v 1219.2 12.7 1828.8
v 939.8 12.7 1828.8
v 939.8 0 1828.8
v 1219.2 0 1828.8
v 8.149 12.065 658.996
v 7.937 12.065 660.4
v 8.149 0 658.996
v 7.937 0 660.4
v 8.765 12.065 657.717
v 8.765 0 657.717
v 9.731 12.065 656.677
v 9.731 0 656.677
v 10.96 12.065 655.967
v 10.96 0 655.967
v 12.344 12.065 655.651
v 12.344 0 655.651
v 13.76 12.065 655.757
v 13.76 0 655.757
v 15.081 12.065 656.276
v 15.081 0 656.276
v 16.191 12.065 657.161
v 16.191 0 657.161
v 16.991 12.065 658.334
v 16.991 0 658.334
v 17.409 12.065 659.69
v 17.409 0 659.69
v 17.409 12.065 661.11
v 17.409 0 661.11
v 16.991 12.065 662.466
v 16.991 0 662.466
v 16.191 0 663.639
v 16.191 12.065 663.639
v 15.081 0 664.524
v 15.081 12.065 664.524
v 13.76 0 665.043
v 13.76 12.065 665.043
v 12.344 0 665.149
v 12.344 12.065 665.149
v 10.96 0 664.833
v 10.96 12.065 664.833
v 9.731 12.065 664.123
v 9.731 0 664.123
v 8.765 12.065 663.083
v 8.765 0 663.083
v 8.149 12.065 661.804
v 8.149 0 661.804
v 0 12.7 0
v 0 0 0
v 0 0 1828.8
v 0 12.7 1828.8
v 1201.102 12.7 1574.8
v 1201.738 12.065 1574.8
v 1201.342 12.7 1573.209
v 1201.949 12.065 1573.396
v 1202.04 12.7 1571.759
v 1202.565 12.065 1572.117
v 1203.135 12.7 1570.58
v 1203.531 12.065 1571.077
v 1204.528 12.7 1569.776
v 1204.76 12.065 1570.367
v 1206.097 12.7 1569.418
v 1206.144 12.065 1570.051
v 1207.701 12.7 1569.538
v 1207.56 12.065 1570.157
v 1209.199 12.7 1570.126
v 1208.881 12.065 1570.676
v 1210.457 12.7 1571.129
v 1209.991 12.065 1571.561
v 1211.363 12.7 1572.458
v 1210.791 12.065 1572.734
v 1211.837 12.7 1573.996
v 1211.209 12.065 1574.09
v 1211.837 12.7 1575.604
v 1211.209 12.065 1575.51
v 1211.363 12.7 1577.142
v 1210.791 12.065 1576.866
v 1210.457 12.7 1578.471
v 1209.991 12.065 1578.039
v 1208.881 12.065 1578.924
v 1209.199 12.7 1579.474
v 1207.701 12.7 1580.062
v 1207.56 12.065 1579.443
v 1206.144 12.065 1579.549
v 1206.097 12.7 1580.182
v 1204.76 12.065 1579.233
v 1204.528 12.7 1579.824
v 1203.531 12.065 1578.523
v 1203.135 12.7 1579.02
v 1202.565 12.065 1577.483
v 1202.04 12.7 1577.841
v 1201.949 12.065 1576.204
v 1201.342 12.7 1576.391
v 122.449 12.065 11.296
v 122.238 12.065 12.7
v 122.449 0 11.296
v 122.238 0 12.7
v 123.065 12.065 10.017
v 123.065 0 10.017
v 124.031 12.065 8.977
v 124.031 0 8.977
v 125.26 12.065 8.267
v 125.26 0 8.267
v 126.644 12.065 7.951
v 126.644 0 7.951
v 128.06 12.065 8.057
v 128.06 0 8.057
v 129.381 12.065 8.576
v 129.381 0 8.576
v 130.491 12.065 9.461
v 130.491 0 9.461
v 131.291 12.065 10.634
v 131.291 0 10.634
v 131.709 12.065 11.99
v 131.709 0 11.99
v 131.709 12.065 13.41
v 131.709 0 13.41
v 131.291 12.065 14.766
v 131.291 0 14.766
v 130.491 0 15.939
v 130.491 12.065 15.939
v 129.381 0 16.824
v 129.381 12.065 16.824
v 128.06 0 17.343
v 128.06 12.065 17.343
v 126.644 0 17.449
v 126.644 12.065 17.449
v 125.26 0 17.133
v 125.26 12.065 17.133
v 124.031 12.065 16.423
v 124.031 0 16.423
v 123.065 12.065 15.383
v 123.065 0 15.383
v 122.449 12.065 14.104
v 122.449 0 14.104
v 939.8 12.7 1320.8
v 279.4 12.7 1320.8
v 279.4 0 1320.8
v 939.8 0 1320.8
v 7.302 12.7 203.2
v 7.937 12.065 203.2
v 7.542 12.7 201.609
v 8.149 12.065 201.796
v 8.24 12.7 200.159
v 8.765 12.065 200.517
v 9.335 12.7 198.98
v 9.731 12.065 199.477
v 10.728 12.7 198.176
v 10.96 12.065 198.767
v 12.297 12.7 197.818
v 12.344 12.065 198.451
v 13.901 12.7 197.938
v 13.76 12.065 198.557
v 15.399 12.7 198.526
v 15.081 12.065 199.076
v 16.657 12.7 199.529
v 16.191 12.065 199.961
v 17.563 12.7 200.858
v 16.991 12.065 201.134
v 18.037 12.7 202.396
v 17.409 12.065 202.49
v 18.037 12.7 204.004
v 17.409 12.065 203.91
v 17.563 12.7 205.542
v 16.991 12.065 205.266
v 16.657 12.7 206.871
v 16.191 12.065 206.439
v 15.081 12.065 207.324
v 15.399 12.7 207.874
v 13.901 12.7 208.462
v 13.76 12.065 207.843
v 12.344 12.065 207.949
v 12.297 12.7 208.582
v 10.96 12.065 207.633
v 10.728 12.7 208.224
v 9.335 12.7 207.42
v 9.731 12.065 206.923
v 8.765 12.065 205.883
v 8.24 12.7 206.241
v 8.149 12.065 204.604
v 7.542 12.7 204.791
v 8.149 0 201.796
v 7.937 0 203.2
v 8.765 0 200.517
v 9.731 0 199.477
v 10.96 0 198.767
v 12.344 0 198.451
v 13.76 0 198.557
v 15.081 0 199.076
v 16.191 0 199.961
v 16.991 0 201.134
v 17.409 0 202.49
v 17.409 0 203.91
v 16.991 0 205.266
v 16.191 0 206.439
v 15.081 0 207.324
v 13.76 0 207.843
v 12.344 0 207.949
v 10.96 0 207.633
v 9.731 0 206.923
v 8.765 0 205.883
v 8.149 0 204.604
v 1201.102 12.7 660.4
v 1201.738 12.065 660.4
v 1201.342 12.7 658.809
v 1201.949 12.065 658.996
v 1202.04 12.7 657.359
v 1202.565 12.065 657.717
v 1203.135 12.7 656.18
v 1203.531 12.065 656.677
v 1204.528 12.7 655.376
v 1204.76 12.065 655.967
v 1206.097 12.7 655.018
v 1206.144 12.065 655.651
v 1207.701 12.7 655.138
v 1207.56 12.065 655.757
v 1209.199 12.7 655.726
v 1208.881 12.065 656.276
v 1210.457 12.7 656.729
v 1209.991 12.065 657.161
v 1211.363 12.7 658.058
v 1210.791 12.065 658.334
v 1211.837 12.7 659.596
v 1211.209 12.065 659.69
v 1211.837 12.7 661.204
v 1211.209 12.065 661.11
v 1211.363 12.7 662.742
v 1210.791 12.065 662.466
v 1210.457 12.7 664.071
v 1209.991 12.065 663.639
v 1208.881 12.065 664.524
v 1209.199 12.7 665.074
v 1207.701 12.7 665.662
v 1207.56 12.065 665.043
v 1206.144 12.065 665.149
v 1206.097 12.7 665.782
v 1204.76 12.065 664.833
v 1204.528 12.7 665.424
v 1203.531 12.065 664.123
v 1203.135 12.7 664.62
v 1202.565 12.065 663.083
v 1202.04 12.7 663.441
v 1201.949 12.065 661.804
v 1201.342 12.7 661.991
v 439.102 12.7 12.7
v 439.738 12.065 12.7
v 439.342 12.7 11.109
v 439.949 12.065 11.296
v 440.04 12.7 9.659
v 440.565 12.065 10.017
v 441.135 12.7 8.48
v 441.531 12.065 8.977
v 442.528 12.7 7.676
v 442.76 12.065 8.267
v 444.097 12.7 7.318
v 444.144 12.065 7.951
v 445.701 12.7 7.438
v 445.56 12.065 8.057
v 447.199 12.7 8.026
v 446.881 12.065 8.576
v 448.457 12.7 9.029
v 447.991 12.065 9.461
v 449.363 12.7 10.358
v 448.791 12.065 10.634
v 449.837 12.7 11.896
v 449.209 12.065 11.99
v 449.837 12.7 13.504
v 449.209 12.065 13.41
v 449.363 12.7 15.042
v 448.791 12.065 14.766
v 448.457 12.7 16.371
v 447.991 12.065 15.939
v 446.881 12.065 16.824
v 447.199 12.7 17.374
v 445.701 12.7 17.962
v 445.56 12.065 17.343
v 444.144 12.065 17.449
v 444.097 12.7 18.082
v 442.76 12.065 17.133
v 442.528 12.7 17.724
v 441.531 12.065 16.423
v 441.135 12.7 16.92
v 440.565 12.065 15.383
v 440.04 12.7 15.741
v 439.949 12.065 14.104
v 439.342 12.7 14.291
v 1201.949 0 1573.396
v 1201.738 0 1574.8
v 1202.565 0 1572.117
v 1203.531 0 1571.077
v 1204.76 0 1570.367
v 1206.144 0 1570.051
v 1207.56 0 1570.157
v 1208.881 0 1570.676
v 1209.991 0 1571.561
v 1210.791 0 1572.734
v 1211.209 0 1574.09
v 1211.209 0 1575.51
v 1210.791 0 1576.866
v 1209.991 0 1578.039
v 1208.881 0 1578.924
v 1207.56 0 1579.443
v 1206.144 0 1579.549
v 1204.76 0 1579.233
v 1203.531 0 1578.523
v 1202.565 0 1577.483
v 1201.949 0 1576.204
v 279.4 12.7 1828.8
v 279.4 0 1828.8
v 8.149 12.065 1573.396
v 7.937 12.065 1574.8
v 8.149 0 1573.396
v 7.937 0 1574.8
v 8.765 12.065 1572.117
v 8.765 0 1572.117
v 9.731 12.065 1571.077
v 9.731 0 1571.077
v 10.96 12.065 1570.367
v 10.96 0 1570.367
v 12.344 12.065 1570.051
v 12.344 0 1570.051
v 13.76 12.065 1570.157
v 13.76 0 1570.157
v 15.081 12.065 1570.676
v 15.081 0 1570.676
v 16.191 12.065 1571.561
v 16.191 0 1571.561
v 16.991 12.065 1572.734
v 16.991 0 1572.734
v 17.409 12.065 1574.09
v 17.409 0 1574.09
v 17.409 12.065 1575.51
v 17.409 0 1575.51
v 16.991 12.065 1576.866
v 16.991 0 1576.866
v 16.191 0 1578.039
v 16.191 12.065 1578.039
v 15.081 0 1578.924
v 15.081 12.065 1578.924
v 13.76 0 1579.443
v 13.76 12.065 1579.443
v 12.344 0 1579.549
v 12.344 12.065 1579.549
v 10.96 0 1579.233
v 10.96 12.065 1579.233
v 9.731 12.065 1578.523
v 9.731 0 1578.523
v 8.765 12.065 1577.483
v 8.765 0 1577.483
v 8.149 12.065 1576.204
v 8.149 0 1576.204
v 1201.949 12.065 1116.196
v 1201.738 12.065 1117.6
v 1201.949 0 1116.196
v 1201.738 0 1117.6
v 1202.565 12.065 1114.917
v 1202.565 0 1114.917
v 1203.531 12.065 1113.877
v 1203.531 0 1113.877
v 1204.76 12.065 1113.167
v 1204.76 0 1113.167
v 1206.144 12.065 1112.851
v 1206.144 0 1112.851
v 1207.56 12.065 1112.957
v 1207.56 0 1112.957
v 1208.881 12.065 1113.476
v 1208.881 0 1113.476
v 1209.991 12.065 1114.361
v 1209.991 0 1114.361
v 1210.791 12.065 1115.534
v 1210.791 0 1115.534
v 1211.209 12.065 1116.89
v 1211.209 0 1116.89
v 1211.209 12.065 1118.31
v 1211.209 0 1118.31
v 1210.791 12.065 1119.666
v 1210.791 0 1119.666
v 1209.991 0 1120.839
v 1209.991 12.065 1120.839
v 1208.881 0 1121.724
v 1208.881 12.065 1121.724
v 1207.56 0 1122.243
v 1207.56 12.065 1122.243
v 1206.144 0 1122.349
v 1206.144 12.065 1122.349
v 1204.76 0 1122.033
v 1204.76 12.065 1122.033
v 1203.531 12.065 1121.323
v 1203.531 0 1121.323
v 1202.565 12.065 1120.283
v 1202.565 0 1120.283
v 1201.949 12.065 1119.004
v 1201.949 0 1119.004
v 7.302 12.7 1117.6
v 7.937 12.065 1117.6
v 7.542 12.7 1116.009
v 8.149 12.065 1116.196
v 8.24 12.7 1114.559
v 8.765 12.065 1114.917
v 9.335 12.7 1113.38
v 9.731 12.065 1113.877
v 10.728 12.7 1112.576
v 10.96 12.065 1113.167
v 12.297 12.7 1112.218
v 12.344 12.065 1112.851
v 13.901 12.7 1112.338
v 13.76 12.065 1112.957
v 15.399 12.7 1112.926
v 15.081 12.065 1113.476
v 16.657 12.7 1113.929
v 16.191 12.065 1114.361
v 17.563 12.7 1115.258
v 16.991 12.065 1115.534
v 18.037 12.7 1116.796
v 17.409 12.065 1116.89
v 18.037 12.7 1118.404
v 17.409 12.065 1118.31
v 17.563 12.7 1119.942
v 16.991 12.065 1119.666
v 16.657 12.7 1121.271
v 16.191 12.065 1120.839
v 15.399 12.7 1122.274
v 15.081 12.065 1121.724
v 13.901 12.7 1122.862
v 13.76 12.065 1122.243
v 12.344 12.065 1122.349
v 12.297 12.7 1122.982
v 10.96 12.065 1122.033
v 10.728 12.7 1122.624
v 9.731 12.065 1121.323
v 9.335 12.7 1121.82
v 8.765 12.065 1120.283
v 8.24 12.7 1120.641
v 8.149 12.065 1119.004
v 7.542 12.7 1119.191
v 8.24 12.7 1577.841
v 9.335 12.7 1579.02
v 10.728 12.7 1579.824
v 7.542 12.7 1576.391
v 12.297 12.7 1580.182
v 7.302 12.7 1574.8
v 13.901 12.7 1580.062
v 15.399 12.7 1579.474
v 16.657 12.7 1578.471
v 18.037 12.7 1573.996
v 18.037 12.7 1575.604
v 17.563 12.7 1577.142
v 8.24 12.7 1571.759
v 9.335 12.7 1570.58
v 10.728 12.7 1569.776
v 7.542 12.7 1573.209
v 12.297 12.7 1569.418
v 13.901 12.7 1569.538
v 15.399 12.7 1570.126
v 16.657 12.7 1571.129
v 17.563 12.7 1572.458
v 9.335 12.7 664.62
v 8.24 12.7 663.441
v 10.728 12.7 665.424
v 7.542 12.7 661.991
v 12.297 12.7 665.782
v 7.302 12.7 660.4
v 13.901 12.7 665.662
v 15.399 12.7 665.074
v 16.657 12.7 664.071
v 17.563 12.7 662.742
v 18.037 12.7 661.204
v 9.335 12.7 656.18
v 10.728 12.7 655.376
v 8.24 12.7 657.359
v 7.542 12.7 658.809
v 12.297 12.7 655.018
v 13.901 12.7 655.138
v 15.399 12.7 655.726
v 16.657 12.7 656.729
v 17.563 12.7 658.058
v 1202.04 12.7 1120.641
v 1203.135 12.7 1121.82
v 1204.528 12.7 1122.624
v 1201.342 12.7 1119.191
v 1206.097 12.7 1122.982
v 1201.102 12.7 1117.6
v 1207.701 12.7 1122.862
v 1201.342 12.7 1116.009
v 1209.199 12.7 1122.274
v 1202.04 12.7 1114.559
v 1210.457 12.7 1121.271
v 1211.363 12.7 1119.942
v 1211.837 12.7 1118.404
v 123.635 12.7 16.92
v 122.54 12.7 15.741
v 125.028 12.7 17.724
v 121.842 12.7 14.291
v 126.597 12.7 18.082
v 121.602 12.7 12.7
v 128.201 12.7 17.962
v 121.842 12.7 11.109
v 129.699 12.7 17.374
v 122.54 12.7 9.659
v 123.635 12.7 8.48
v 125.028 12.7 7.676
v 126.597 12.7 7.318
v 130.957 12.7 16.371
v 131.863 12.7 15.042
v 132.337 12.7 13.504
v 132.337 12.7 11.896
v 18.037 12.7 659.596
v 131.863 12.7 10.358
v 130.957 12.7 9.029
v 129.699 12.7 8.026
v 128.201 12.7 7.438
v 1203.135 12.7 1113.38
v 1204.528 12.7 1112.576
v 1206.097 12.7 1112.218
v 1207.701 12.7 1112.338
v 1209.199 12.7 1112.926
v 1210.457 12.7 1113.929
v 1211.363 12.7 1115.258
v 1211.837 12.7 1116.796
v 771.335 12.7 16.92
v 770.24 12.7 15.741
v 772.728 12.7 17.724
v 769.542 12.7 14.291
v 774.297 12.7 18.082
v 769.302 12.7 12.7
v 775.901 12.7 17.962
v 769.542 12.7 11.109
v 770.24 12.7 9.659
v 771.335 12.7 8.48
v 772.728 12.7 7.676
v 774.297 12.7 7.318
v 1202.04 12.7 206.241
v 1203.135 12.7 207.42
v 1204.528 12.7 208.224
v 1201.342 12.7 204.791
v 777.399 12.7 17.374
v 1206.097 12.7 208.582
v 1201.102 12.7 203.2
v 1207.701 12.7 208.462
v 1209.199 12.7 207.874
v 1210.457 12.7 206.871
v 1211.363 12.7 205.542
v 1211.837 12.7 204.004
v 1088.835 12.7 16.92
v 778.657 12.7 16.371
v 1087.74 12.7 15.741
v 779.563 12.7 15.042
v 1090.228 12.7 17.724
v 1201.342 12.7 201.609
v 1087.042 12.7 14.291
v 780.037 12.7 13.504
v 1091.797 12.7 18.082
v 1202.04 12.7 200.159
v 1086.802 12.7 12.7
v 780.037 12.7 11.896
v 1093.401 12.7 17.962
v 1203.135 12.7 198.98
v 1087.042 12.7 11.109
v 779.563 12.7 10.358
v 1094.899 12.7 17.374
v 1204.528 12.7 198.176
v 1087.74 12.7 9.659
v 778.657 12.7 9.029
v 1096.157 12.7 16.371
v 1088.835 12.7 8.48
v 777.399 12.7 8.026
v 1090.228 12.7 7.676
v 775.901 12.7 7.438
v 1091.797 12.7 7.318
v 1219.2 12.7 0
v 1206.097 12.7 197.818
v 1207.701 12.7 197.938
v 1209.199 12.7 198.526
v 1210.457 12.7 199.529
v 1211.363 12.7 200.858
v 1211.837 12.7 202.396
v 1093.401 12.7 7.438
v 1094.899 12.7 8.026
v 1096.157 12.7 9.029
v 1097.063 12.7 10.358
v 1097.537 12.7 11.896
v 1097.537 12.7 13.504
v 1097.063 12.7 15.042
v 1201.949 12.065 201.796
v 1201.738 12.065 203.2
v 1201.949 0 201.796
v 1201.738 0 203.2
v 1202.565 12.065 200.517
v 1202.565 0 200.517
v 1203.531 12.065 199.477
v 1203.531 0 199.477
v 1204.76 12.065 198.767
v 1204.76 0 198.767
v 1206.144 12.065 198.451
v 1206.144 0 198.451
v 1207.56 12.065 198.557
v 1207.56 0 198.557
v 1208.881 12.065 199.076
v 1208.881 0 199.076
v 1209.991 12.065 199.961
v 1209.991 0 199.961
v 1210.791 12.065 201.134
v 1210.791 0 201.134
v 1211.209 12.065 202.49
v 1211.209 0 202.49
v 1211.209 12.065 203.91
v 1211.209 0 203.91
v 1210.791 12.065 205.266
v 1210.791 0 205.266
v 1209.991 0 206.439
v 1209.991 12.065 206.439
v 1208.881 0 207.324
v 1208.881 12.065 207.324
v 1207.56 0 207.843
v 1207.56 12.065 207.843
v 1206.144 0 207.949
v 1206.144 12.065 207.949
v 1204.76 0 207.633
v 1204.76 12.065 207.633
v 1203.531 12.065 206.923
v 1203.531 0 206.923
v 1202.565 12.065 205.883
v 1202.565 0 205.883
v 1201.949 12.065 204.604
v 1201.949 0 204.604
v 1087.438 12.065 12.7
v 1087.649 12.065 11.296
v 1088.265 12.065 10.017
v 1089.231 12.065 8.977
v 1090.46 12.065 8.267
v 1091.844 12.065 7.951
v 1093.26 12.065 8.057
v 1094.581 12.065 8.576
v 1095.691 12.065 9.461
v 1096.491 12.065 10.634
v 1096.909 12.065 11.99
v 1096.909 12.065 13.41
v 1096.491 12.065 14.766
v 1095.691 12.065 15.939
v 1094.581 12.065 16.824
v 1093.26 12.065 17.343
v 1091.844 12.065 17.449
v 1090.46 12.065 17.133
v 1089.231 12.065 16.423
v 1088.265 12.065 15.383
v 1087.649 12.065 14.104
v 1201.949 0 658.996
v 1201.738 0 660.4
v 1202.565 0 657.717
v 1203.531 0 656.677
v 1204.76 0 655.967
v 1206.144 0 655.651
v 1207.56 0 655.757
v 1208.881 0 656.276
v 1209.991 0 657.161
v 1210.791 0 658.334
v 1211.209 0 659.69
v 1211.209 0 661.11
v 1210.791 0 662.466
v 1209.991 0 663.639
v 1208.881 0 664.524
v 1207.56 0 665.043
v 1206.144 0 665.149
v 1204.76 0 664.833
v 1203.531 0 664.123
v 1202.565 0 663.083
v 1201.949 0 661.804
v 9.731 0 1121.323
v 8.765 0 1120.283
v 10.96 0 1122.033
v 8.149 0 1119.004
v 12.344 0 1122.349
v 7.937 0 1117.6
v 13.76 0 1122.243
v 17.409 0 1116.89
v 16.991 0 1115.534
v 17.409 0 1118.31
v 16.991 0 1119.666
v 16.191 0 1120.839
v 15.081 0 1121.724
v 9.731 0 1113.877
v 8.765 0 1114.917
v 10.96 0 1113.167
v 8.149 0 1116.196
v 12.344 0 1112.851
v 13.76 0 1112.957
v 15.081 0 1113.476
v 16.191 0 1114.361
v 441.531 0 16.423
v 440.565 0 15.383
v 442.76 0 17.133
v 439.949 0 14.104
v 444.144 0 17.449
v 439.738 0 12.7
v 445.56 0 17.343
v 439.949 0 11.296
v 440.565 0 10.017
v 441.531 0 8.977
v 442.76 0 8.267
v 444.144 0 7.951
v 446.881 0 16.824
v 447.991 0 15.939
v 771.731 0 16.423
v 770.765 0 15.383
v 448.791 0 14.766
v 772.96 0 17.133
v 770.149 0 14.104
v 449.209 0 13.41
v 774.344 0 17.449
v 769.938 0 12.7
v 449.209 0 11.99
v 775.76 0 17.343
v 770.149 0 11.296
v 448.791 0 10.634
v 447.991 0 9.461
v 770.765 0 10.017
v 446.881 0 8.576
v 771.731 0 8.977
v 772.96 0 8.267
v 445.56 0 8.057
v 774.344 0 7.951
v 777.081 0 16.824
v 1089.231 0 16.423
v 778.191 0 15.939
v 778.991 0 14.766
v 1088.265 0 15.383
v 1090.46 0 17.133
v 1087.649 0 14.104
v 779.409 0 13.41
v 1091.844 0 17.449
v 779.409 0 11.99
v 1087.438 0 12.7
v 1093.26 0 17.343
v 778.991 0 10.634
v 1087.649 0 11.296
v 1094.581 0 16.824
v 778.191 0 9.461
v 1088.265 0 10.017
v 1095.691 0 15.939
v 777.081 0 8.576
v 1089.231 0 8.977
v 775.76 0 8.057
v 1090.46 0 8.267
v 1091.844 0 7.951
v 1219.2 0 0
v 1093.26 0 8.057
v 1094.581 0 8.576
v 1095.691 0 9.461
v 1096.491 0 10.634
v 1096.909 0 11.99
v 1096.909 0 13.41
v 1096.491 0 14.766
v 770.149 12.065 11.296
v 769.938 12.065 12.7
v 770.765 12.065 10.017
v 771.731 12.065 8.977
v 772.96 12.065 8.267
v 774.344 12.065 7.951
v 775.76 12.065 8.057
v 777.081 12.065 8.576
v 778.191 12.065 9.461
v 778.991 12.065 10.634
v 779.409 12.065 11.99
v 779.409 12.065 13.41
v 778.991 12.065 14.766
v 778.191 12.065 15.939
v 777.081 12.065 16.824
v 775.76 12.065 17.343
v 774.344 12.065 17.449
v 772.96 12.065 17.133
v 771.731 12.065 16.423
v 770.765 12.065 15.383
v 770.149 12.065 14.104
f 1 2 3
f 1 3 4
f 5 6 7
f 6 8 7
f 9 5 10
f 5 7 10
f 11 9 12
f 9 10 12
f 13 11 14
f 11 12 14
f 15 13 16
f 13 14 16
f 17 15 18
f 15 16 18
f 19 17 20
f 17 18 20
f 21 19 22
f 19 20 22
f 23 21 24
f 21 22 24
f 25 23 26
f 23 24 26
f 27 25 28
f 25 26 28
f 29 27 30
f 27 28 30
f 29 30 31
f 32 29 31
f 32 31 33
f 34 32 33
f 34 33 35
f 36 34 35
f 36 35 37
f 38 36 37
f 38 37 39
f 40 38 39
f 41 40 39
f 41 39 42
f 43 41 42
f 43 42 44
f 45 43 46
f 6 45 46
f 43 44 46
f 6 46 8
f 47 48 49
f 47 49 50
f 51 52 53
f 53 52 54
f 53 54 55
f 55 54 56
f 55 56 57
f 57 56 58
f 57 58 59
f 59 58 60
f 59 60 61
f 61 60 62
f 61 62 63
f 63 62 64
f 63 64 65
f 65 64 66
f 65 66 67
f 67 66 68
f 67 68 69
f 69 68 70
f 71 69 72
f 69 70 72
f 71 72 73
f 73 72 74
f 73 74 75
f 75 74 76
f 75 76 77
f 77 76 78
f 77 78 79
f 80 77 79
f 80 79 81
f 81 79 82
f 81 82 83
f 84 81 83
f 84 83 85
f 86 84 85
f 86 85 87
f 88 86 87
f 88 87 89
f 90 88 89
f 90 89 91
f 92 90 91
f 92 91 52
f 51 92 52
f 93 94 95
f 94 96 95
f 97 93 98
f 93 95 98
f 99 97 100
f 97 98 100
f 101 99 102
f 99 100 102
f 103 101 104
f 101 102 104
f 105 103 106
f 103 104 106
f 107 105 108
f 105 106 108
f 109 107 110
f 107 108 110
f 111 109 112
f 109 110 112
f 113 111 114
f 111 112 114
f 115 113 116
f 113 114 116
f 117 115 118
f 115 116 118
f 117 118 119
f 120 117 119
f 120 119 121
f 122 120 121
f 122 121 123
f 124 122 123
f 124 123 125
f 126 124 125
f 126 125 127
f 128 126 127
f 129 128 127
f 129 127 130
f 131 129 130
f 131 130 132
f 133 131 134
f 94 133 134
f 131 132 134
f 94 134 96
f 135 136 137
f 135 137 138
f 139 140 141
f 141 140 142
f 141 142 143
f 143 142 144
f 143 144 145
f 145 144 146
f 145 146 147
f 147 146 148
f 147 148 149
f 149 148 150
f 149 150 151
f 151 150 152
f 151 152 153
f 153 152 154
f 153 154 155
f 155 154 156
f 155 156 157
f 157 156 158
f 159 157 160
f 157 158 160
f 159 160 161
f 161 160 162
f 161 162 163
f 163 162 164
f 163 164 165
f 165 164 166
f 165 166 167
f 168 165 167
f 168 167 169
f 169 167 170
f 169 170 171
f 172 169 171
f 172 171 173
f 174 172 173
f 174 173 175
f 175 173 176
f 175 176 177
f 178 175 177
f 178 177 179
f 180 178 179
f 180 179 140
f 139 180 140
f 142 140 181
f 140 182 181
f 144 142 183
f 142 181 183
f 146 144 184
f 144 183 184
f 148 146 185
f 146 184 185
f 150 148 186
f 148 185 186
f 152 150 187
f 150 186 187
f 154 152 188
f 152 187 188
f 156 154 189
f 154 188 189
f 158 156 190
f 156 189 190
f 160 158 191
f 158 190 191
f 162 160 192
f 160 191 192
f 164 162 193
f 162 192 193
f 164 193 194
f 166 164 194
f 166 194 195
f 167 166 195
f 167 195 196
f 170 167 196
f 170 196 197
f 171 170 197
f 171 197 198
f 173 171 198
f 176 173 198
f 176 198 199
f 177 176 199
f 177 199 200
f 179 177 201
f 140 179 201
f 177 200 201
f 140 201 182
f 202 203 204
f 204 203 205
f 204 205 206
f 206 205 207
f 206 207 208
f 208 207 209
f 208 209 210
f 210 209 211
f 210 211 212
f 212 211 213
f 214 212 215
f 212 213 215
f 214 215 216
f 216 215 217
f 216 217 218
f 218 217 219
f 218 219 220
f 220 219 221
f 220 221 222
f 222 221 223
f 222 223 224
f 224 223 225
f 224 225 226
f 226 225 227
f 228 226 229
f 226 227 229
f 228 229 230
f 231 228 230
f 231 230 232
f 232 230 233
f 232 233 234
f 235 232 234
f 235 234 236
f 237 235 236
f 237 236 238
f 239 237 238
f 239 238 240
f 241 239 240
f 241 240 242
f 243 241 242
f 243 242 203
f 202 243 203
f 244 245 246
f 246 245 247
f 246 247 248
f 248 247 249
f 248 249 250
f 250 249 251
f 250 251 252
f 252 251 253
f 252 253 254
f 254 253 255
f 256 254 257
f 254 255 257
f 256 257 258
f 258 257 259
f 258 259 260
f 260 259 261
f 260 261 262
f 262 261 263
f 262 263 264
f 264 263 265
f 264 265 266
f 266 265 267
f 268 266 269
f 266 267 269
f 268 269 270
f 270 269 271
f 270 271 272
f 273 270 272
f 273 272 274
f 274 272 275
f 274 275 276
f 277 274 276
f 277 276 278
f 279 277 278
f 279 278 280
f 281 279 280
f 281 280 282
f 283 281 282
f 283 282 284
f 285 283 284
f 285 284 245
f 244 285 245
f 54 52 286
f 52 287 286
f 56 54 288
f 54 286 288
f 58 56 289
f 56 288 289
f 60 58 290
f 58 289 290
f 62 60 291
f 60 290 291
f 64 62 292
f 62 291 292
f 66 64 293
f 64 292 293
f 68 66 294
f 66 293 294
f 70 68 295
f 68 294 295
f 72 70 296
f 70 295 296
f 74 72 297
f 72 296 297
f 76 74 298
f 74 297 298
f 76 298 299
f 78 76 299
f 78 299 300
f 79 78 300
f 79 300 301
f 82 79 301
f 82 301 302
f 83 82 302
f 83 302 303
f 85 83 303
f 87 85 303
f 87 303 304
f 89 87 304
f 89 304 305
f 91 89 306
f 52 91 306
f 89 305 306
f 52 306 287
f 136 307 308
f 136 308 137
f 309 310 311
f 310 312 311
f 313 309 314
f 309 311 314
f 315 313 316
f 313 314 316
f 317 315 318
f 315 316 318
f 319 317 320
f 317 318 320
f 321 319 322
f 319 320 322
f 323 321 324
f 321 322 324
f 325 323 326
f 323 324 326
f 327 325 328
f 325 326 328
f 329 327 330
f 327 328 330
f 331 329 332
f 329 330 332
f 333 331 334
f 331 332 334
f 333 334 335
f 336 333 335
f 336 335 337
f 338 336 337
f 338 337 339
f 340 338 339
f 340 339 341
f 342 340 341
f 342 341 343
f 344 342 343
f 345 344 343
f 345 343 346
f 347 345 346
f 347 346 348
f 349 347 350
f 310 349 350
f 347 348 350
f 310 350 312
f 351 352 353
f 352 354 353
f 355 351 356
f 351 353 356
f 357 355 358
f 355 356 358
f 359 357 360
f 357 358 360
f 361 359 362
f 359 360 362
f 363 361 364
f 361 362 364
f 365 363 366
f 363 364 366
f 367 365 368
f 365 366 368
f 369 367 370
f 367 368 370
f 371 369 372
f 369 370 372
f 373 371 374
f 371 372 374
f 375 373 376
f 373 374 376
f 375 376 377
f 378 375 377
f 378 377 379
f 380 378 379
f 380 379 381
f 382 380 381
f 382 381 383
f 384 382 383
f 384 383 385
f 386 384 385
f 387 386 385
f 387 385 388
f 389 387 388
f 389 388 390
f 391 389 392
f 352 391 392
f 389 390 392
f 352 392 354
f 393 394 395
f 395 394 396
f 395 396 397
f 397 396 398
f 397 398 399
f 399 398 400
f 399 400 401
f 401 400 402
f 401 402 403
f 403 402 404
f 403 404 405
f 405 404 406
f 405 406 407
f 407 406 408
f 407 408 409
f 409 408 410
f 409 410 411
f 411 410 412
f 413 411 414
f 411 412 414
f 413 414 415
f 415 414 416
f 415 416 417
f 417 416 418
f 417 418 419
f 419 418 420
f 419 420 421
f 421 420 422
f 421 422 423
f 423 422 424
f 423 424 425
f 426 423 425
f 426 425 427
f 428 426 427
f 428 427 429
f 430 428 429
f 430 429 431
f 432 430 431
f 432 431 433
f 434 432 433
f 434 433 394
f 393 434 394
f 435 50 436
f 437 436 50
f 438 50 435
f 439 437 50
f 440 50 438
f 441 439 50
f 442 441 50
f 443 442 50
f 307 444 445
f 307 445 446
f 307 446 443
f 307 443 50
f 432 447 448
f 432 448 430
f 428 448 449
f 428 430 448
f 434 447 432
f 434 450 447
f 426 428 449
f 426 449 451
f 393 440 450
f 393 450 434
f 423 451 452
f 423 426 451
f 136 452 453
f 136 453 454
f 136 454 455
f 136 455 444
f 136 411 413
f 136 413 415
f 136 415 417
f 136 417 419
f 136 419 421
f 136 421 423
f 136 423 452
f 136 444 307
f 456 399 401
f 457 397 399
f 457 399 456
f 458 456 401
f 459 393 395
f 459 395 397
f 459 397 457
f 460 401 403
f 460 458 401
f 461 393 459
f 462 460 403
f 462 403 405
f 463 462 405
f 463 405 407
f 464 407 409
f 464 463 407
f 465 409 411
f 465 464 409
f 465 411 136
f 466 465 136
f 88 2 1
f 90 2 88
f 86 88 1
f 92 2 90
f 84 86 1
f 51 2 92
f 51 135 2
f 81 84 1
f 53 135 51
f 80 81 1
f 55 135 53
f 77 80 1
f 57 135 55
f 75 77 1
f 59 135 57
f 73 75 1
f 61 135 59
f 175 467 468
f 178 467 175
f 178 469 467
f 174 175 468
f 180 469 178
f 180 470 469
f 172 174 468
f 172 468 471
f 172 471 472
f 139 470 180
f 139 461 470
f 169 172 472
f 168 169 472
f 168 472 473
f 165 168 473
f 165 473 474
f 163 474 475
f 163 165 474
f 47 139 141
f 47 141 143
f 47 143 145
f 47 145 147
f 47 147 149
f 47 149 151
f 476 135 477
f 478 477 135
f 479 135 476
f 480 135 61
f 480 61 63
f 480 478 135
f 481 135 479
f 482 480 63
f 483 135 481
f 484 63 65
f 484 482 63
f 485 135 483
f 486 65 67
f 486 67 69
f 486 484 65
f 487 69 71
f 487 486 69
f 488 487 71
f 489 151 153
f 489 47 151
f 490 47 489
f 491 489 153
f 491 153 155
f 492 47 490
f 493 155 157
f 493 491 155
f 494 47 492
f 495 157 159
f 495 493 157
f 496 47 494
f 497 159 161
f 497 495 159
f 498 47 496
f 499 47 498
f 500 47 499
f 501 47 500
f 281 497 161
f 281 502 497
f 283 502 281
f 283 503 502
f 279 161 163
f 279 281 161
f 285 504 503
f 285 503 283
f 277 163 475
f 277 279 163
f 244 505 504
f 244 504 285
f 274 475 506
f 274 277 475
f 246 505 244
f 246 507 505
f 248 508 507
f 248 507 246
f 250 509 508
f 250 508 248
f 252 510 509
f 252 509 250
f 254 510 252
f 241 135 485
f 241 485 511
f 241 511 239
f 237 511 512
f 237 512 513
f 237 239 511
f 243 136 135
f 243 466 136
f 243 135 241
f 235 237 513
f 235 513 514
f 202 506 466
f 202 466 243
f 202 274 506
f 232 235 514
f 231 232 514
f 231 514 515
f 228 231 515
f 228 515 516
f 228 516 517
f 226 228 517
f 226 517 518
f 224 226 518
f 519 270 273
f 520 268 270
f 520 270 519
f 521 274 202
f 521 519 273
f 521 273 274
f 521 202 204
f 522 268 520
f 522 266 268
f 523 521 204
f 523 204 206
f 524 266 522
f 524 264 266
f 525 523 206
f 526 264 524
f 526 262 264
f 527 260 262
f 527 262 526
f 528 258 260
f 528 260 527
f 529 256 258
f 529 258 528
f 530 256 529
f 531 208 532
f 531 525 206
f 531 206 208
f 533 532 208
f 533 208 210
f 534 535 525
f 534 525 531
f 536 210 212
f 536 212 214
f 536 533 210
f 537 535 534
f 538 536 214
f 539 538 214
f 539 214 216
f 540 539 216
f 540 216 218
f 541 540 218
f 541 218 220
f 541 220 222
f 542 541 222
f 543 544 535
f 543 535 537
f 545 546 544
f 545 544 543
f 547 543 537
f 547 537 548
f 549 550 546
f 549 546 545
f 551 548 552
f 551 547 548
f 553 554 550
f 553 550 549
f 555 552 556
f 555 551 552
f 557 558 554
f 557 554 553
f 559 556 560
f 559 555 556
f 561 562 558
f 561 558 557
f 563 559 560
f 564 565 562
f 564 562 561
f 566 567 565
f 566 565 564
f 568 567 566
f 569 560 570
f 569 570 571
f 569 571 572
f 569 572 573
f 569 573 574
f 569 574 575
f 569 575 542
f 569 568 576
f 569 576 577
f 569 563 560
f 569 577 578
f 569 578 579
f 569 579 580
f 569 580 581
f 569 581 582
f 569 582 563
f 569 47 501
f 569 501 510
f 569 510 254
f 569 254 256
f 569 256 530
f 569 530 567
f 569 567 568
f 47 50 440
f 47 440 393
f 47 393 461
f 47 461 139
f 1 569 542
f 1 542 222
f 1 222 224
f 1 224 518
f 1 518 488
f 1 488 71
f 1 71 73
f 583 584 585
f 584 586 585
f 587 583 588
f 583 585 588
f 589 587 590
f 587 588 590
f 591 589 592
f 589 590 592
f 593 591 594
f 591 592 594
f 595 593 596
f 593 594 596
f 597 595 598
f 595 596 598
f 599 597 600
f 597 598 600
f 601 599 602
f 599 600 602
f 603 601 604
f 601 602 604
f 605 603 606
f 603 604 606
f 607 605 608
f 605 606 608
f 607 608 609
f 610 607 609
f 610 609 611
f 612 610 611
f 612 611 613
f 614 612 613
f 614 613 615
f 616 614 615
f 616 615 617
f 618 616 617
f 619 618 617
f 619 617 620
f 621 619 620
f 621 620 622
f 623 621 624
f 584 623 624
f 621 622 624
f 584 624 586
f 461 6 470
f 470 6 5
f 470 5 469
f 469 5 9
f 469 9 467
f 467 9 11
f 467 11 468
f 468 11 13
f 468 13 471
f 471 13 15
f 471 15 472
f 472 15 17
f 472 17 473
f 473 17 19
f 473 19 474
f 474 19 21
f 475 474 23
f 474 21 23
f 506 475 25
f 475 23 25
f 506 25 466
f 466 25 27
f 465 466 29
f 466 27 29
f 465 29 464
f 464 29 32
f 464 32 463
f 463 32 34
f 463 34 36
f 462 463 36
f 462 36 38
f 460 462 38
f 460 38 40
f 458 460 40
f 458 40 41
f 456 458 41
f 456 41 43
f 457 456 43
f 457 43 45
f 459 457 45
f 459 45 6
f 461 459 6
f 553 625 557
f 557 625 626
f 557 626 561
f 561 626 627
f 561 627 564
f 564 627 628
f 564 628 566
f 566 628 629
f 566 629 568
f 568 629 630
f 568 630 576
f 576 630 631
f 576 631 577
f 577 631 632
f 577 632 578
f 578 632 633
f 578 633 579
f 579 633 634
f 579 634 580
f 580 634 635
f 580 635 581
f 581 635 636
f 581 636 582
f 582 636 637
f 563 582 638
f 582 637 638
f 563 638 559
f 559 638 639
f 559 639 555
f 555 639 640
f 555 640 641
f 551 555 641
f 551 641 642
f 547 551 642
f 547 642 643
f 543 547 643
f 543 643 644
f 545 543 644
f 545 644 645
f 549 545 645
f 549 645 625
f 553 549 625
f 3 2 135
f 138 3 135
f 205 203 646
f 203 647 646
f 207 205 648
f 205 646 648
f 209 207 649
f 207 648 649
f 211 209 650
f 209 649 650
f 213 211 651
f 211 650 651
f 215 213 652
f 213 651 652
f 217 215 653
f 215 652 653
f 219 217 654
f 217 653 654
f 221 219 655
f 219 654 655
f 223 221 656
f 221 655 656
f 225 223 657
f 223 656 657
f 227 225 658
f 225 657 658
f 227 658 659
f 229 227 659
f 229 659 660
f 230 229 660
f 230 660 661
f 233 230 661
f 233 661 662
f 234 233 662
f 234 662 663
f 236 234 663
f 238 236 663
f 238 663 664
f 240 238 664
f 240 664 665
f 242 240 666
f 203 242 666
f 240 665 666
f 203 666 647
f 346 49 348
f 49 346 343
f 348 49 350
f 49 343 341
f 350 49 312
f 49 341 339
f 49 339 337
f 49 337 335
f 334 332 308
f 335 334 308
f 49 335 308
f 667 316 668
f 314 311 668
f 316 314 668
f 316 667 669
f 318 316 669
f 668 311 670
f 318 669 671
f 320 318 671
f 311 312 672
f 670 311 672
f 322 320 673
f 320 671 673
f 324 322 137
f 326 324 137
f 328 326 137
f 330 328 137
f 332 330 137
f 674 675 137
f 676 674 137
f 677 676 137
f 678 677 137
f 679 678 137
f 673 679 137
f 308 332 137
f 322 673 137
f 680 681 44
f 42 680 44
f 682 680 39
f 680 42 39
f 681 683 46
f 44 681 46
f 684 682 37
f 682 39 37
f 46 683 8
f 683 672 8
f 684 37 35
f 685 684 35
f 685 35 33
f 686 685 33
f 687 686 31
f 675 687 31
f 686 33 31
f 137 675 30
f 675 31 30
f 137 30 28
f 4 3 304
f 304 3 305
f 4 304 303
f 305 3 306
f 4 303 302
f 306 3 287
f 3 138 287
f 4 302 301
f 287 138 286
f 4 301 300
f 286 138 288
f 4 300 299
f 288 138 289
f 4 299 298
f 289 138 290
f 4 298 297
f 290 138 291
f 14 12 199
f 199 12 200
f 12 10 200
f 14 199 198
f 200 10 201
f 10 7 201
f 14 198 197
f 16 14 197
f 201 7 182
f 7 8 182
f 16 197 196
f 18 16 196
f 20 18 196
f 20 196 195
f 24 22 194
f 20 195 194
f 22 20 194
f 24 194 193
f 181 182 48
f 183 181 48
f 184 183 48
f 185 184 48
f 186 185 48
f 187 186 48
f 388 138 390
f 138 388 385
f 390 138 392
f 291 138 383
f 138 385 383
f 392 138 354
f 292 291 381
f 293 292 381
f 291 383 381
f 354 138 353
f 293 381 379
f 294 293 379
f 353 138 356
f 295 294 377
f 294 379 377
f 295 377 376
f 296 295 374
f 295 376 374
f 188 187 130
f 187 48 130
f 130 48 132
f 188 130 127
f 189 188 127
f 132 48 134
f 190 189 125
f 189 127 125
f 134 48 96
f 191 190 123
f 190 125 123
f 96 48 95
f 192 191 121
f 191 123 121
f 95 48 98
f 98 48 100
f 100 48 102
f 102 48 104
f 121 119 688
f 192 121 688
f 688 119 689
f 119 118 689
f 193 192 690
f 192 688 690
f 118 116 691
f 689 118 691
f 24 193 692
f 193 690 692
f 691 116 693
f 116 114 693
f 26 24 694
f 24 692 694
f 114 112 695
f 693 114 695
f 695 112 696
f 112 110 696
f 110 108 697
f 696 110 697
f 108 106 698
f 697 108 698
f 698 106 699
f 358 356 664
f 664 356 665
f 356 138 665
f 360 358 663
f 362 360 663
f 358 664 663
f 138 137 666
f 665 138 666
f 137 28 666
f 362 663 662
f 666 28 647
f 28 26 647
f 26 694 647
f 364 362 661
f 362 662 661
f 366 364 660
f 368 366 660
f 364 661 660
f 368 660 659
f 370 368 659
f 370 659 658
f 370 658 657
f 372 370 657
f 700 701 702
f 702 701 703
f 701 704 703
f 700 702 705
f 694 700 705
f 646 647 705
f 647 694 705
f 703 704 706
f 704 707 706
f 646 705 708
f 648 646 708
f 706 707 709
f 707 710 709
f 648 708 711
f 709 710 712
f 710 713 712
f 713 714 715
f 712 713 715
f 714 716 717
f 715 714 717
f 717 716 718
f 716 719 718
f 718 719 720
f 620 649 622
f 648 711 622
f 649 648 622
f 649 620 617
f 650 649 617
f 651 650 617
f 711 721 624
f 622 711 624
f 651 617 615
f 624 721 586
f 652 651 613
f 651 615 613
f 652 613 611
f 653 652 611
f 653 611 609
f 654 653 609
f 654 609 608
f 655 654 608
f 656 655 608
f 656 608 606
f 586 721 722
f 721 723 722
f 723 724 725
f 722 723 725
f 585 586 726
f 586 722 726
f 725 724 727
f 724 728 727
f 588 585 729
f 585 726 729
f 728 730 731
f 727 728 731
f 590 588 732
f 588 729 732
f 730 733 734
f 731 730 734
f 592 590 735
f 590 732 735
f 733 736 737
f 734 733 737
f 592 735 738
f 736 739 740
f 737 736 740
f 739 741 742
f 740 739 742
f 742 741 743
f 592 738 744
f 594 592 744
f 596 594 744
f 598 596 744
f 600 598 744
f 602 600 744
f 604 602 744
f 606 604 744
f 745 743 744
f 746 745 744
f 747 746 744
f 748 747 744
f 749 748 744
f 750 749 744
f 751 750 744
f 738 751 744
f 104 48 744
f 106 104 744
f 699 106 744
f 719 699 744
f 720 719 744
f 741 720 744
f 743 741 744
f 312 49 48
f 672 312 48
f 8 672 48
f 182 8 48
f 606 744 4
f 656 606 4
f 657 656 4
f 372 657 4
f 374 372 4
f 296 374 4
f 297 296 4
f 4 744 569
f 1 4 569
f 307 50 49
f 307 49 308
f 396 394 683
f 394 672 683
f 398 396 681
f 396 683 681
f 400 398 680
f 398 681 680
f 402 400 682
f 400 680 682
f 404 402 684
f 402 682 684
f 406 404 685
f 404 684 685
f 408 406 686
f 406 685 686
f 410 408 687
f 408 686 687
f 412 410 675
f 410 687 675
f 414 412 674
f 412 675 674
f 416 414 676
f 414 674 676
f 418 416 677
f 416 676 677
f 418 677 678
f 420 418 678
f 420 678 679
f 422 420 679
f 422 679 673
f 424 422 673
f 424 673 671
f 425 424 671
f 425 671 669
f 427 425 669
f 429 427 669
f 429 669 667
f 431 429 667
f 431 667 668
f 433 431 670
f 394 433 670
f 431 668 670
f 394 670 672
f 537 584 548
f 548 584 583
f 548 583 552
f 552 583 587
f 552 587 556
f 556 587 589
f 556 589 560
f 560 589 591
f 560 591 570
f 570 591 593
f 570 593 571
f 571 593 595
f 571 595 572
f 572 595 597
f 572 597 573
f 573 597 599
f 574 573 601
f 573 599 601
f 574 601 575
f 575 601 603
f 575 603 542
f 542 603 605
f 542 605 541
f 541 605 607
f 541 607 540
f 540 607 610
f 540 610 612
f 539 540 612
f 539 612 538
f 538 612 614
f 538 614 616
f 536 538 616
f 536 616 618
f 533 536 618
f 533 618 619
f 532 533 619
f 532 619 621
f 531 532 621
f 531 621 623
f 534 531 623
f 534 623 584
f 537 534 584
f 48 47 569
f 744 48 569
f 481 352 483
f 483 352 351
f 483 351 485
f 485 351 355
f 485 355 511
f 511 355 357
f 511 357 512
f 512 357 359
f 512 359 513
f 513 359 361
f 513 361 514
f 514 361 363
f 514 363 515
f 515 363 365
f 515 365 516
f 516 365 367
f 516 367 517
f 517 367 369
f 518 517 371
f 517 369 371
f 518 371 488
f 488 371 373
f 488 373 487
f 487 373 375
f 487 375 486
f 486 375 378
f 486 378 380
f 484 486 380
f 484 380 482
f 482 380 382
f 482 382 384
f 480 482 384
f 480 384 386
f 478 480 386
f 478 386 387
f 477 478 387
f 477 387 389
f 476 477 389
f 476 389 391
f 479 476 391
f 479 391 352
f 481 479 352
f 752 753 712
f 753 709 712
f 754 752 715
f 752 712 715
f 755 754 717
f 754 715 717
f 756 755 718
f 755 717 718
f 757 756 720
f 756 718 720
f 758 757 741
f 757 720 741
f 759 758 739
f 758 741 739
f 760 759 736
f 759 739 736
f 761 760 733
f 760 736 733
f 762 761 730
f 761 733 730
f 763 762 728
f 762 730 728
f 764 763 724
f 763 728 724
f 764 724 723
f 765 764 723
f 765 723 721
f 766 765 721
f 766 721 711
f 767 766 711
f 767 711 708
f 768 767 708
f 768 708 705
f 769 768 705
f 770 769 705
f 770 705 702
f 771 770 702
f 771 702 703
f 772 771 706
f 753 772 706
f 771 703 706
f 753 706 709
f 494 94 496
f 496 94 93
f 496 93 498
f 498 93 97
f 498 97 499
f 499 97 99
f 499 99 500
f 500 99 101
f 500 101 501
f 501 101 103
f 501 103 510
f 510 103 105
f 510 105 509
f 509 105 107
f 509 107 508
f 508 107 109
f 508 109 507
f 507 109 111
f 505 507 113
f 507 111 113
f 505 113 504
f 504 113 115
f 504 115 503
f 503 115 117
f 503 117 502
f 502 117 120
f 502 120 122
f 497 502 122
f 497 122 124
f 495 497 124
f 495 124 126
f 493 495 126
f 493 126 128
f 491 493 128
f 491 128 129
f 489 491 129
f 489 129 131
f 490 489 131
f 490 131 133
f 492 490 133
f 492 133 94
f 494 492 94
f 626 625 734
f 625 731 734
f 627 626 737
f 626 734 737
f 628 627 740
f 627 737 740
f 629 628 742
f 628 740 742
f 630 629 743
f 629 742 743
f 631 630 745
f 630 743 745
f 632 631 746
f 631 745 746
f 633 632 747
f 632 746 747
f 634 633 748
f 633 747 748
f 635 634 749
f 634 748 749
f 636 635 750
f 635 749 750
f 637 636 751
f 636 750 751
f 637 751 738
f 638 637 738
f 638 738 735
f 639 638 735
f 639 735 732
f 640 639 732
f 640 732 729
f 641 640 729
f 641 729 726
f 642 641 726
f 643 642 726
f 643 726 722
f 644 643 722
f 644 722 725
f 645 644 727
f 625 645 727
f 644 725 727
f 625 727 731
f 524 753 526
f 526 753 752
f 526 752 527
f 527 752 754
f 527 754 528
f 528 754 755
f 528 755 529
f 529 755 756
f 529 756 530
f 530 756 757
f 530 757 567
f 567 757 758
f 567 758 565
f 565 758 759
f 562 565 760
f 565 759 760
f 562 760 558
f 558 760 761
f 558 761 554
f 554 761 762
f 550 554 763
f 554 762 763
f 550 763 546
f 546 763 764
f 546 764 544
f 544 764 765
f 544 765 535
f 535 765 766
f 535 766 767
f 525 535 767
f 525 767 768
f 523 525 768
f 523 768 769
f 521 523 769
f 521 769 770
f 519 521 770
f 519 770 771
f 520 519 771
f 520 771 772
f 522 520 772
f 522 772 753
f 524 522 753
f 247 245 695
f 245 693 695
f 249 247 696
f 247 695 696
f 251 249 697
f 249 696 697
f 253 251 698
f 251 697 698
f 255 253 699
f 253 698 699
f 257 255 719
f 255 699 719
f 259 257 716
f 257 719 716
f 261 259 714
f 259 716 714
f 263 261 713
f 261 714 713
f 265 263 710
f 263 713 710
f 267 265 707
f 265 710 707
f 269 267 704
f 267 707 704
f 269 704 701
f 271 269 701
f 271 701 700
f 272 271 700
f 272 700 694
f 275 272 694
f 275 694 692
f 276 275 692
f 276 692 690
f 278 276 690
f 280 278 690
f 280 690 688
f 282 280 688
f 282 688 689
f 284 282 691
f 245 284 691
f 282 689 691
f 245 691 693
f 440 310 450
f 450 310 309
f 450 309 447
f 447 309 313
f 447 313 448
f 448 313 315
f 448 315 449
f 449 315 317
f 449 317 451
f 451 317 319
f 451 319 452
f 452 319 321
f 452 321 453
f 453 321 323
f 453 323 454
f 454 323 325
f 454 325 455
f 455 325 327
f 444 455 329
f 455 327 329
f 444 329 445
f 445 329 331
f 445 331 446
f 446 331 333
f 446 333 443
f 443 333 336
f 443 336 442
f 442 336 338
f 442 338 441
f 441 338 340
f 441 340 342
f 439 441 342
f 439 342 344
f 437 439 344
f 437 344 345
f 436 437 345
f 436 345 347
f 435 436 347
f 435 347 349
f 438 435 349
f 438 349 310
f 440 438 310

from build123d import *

# Parameters (mm, degrees)
SKETCH1_W                              = 1219.2
SKETCH1_H                              = 12.7
BOSS_EXTRUDE1_DEPTH                    = 1828.8
SKETCH2_W                              = 660.4
SKETCH2_H                              = 508
CUT_EXTRUDE1_DEPTH                     = 13.7
F_3_8_0_375_DIAMETER_HOLE1_D           = 9.525
F_3_8_0_375_DIAMETER_HOLE1_CSINK_D     = 10.795
F_3_8_0_375_DIAMETER_HOLE1_CSINK_ANGLE = 90


with BuildPart() as part:
    # Sketch1 → Boss-Extrude1 (new body)
    with BuildSketch(Plane.XY):
        with Locations((609.6, 6.35)):
            Rectangle(SKETCH1_W, SKETCH1_H)
    extrude(amount=BOSS_EXTRUDE1_DEPTH)

    # Sketch2 → Cut-Extrude1 (cut, through all)
    with BuildSketch(Plane(origin=(0, 12.7, 0), x_dir=(1, 0, 0), z_dir=(0, 1, 0))):
        with Locations((609.6, -1574.8)):
            Rectangle(SKETCH2_W, SKETCH2_H)
    extrude(amount=-CUT_EXTRUDE1_DEPTH, mode=Mode.SUBTRACT)

    # 3/8 (0.375) Diameter Hole1 (through all)
    with Locations(Plane(origin=(0, 12.7, 0), x_dir=(1, 0, 0), z_dir=(0, 1, 0))):
        with Locations((1206.5, -1574.8), (1206.5, -1117.6), (1206.5, -660.4), (1206.5, -203.2), (12.7, -1574.8), (12.7, -1117.6), (12.7, -660.4), (12.7, -203.2), (444.5, -12.7), (127, -12.7), (1092.2, -12.7), (774.7, -12.7)):
            CounterSinkHole(F_3_8_0_375_DIAMETER_HOLE1_D / 2, F_3_8_0_375_DIAMETER_HOLE1_CSINK_D / 2, counter_sink_angle=F_3_8_0_375_DIAMETER_HOLE1_CSINK_ANGLE)


solid = part.part
